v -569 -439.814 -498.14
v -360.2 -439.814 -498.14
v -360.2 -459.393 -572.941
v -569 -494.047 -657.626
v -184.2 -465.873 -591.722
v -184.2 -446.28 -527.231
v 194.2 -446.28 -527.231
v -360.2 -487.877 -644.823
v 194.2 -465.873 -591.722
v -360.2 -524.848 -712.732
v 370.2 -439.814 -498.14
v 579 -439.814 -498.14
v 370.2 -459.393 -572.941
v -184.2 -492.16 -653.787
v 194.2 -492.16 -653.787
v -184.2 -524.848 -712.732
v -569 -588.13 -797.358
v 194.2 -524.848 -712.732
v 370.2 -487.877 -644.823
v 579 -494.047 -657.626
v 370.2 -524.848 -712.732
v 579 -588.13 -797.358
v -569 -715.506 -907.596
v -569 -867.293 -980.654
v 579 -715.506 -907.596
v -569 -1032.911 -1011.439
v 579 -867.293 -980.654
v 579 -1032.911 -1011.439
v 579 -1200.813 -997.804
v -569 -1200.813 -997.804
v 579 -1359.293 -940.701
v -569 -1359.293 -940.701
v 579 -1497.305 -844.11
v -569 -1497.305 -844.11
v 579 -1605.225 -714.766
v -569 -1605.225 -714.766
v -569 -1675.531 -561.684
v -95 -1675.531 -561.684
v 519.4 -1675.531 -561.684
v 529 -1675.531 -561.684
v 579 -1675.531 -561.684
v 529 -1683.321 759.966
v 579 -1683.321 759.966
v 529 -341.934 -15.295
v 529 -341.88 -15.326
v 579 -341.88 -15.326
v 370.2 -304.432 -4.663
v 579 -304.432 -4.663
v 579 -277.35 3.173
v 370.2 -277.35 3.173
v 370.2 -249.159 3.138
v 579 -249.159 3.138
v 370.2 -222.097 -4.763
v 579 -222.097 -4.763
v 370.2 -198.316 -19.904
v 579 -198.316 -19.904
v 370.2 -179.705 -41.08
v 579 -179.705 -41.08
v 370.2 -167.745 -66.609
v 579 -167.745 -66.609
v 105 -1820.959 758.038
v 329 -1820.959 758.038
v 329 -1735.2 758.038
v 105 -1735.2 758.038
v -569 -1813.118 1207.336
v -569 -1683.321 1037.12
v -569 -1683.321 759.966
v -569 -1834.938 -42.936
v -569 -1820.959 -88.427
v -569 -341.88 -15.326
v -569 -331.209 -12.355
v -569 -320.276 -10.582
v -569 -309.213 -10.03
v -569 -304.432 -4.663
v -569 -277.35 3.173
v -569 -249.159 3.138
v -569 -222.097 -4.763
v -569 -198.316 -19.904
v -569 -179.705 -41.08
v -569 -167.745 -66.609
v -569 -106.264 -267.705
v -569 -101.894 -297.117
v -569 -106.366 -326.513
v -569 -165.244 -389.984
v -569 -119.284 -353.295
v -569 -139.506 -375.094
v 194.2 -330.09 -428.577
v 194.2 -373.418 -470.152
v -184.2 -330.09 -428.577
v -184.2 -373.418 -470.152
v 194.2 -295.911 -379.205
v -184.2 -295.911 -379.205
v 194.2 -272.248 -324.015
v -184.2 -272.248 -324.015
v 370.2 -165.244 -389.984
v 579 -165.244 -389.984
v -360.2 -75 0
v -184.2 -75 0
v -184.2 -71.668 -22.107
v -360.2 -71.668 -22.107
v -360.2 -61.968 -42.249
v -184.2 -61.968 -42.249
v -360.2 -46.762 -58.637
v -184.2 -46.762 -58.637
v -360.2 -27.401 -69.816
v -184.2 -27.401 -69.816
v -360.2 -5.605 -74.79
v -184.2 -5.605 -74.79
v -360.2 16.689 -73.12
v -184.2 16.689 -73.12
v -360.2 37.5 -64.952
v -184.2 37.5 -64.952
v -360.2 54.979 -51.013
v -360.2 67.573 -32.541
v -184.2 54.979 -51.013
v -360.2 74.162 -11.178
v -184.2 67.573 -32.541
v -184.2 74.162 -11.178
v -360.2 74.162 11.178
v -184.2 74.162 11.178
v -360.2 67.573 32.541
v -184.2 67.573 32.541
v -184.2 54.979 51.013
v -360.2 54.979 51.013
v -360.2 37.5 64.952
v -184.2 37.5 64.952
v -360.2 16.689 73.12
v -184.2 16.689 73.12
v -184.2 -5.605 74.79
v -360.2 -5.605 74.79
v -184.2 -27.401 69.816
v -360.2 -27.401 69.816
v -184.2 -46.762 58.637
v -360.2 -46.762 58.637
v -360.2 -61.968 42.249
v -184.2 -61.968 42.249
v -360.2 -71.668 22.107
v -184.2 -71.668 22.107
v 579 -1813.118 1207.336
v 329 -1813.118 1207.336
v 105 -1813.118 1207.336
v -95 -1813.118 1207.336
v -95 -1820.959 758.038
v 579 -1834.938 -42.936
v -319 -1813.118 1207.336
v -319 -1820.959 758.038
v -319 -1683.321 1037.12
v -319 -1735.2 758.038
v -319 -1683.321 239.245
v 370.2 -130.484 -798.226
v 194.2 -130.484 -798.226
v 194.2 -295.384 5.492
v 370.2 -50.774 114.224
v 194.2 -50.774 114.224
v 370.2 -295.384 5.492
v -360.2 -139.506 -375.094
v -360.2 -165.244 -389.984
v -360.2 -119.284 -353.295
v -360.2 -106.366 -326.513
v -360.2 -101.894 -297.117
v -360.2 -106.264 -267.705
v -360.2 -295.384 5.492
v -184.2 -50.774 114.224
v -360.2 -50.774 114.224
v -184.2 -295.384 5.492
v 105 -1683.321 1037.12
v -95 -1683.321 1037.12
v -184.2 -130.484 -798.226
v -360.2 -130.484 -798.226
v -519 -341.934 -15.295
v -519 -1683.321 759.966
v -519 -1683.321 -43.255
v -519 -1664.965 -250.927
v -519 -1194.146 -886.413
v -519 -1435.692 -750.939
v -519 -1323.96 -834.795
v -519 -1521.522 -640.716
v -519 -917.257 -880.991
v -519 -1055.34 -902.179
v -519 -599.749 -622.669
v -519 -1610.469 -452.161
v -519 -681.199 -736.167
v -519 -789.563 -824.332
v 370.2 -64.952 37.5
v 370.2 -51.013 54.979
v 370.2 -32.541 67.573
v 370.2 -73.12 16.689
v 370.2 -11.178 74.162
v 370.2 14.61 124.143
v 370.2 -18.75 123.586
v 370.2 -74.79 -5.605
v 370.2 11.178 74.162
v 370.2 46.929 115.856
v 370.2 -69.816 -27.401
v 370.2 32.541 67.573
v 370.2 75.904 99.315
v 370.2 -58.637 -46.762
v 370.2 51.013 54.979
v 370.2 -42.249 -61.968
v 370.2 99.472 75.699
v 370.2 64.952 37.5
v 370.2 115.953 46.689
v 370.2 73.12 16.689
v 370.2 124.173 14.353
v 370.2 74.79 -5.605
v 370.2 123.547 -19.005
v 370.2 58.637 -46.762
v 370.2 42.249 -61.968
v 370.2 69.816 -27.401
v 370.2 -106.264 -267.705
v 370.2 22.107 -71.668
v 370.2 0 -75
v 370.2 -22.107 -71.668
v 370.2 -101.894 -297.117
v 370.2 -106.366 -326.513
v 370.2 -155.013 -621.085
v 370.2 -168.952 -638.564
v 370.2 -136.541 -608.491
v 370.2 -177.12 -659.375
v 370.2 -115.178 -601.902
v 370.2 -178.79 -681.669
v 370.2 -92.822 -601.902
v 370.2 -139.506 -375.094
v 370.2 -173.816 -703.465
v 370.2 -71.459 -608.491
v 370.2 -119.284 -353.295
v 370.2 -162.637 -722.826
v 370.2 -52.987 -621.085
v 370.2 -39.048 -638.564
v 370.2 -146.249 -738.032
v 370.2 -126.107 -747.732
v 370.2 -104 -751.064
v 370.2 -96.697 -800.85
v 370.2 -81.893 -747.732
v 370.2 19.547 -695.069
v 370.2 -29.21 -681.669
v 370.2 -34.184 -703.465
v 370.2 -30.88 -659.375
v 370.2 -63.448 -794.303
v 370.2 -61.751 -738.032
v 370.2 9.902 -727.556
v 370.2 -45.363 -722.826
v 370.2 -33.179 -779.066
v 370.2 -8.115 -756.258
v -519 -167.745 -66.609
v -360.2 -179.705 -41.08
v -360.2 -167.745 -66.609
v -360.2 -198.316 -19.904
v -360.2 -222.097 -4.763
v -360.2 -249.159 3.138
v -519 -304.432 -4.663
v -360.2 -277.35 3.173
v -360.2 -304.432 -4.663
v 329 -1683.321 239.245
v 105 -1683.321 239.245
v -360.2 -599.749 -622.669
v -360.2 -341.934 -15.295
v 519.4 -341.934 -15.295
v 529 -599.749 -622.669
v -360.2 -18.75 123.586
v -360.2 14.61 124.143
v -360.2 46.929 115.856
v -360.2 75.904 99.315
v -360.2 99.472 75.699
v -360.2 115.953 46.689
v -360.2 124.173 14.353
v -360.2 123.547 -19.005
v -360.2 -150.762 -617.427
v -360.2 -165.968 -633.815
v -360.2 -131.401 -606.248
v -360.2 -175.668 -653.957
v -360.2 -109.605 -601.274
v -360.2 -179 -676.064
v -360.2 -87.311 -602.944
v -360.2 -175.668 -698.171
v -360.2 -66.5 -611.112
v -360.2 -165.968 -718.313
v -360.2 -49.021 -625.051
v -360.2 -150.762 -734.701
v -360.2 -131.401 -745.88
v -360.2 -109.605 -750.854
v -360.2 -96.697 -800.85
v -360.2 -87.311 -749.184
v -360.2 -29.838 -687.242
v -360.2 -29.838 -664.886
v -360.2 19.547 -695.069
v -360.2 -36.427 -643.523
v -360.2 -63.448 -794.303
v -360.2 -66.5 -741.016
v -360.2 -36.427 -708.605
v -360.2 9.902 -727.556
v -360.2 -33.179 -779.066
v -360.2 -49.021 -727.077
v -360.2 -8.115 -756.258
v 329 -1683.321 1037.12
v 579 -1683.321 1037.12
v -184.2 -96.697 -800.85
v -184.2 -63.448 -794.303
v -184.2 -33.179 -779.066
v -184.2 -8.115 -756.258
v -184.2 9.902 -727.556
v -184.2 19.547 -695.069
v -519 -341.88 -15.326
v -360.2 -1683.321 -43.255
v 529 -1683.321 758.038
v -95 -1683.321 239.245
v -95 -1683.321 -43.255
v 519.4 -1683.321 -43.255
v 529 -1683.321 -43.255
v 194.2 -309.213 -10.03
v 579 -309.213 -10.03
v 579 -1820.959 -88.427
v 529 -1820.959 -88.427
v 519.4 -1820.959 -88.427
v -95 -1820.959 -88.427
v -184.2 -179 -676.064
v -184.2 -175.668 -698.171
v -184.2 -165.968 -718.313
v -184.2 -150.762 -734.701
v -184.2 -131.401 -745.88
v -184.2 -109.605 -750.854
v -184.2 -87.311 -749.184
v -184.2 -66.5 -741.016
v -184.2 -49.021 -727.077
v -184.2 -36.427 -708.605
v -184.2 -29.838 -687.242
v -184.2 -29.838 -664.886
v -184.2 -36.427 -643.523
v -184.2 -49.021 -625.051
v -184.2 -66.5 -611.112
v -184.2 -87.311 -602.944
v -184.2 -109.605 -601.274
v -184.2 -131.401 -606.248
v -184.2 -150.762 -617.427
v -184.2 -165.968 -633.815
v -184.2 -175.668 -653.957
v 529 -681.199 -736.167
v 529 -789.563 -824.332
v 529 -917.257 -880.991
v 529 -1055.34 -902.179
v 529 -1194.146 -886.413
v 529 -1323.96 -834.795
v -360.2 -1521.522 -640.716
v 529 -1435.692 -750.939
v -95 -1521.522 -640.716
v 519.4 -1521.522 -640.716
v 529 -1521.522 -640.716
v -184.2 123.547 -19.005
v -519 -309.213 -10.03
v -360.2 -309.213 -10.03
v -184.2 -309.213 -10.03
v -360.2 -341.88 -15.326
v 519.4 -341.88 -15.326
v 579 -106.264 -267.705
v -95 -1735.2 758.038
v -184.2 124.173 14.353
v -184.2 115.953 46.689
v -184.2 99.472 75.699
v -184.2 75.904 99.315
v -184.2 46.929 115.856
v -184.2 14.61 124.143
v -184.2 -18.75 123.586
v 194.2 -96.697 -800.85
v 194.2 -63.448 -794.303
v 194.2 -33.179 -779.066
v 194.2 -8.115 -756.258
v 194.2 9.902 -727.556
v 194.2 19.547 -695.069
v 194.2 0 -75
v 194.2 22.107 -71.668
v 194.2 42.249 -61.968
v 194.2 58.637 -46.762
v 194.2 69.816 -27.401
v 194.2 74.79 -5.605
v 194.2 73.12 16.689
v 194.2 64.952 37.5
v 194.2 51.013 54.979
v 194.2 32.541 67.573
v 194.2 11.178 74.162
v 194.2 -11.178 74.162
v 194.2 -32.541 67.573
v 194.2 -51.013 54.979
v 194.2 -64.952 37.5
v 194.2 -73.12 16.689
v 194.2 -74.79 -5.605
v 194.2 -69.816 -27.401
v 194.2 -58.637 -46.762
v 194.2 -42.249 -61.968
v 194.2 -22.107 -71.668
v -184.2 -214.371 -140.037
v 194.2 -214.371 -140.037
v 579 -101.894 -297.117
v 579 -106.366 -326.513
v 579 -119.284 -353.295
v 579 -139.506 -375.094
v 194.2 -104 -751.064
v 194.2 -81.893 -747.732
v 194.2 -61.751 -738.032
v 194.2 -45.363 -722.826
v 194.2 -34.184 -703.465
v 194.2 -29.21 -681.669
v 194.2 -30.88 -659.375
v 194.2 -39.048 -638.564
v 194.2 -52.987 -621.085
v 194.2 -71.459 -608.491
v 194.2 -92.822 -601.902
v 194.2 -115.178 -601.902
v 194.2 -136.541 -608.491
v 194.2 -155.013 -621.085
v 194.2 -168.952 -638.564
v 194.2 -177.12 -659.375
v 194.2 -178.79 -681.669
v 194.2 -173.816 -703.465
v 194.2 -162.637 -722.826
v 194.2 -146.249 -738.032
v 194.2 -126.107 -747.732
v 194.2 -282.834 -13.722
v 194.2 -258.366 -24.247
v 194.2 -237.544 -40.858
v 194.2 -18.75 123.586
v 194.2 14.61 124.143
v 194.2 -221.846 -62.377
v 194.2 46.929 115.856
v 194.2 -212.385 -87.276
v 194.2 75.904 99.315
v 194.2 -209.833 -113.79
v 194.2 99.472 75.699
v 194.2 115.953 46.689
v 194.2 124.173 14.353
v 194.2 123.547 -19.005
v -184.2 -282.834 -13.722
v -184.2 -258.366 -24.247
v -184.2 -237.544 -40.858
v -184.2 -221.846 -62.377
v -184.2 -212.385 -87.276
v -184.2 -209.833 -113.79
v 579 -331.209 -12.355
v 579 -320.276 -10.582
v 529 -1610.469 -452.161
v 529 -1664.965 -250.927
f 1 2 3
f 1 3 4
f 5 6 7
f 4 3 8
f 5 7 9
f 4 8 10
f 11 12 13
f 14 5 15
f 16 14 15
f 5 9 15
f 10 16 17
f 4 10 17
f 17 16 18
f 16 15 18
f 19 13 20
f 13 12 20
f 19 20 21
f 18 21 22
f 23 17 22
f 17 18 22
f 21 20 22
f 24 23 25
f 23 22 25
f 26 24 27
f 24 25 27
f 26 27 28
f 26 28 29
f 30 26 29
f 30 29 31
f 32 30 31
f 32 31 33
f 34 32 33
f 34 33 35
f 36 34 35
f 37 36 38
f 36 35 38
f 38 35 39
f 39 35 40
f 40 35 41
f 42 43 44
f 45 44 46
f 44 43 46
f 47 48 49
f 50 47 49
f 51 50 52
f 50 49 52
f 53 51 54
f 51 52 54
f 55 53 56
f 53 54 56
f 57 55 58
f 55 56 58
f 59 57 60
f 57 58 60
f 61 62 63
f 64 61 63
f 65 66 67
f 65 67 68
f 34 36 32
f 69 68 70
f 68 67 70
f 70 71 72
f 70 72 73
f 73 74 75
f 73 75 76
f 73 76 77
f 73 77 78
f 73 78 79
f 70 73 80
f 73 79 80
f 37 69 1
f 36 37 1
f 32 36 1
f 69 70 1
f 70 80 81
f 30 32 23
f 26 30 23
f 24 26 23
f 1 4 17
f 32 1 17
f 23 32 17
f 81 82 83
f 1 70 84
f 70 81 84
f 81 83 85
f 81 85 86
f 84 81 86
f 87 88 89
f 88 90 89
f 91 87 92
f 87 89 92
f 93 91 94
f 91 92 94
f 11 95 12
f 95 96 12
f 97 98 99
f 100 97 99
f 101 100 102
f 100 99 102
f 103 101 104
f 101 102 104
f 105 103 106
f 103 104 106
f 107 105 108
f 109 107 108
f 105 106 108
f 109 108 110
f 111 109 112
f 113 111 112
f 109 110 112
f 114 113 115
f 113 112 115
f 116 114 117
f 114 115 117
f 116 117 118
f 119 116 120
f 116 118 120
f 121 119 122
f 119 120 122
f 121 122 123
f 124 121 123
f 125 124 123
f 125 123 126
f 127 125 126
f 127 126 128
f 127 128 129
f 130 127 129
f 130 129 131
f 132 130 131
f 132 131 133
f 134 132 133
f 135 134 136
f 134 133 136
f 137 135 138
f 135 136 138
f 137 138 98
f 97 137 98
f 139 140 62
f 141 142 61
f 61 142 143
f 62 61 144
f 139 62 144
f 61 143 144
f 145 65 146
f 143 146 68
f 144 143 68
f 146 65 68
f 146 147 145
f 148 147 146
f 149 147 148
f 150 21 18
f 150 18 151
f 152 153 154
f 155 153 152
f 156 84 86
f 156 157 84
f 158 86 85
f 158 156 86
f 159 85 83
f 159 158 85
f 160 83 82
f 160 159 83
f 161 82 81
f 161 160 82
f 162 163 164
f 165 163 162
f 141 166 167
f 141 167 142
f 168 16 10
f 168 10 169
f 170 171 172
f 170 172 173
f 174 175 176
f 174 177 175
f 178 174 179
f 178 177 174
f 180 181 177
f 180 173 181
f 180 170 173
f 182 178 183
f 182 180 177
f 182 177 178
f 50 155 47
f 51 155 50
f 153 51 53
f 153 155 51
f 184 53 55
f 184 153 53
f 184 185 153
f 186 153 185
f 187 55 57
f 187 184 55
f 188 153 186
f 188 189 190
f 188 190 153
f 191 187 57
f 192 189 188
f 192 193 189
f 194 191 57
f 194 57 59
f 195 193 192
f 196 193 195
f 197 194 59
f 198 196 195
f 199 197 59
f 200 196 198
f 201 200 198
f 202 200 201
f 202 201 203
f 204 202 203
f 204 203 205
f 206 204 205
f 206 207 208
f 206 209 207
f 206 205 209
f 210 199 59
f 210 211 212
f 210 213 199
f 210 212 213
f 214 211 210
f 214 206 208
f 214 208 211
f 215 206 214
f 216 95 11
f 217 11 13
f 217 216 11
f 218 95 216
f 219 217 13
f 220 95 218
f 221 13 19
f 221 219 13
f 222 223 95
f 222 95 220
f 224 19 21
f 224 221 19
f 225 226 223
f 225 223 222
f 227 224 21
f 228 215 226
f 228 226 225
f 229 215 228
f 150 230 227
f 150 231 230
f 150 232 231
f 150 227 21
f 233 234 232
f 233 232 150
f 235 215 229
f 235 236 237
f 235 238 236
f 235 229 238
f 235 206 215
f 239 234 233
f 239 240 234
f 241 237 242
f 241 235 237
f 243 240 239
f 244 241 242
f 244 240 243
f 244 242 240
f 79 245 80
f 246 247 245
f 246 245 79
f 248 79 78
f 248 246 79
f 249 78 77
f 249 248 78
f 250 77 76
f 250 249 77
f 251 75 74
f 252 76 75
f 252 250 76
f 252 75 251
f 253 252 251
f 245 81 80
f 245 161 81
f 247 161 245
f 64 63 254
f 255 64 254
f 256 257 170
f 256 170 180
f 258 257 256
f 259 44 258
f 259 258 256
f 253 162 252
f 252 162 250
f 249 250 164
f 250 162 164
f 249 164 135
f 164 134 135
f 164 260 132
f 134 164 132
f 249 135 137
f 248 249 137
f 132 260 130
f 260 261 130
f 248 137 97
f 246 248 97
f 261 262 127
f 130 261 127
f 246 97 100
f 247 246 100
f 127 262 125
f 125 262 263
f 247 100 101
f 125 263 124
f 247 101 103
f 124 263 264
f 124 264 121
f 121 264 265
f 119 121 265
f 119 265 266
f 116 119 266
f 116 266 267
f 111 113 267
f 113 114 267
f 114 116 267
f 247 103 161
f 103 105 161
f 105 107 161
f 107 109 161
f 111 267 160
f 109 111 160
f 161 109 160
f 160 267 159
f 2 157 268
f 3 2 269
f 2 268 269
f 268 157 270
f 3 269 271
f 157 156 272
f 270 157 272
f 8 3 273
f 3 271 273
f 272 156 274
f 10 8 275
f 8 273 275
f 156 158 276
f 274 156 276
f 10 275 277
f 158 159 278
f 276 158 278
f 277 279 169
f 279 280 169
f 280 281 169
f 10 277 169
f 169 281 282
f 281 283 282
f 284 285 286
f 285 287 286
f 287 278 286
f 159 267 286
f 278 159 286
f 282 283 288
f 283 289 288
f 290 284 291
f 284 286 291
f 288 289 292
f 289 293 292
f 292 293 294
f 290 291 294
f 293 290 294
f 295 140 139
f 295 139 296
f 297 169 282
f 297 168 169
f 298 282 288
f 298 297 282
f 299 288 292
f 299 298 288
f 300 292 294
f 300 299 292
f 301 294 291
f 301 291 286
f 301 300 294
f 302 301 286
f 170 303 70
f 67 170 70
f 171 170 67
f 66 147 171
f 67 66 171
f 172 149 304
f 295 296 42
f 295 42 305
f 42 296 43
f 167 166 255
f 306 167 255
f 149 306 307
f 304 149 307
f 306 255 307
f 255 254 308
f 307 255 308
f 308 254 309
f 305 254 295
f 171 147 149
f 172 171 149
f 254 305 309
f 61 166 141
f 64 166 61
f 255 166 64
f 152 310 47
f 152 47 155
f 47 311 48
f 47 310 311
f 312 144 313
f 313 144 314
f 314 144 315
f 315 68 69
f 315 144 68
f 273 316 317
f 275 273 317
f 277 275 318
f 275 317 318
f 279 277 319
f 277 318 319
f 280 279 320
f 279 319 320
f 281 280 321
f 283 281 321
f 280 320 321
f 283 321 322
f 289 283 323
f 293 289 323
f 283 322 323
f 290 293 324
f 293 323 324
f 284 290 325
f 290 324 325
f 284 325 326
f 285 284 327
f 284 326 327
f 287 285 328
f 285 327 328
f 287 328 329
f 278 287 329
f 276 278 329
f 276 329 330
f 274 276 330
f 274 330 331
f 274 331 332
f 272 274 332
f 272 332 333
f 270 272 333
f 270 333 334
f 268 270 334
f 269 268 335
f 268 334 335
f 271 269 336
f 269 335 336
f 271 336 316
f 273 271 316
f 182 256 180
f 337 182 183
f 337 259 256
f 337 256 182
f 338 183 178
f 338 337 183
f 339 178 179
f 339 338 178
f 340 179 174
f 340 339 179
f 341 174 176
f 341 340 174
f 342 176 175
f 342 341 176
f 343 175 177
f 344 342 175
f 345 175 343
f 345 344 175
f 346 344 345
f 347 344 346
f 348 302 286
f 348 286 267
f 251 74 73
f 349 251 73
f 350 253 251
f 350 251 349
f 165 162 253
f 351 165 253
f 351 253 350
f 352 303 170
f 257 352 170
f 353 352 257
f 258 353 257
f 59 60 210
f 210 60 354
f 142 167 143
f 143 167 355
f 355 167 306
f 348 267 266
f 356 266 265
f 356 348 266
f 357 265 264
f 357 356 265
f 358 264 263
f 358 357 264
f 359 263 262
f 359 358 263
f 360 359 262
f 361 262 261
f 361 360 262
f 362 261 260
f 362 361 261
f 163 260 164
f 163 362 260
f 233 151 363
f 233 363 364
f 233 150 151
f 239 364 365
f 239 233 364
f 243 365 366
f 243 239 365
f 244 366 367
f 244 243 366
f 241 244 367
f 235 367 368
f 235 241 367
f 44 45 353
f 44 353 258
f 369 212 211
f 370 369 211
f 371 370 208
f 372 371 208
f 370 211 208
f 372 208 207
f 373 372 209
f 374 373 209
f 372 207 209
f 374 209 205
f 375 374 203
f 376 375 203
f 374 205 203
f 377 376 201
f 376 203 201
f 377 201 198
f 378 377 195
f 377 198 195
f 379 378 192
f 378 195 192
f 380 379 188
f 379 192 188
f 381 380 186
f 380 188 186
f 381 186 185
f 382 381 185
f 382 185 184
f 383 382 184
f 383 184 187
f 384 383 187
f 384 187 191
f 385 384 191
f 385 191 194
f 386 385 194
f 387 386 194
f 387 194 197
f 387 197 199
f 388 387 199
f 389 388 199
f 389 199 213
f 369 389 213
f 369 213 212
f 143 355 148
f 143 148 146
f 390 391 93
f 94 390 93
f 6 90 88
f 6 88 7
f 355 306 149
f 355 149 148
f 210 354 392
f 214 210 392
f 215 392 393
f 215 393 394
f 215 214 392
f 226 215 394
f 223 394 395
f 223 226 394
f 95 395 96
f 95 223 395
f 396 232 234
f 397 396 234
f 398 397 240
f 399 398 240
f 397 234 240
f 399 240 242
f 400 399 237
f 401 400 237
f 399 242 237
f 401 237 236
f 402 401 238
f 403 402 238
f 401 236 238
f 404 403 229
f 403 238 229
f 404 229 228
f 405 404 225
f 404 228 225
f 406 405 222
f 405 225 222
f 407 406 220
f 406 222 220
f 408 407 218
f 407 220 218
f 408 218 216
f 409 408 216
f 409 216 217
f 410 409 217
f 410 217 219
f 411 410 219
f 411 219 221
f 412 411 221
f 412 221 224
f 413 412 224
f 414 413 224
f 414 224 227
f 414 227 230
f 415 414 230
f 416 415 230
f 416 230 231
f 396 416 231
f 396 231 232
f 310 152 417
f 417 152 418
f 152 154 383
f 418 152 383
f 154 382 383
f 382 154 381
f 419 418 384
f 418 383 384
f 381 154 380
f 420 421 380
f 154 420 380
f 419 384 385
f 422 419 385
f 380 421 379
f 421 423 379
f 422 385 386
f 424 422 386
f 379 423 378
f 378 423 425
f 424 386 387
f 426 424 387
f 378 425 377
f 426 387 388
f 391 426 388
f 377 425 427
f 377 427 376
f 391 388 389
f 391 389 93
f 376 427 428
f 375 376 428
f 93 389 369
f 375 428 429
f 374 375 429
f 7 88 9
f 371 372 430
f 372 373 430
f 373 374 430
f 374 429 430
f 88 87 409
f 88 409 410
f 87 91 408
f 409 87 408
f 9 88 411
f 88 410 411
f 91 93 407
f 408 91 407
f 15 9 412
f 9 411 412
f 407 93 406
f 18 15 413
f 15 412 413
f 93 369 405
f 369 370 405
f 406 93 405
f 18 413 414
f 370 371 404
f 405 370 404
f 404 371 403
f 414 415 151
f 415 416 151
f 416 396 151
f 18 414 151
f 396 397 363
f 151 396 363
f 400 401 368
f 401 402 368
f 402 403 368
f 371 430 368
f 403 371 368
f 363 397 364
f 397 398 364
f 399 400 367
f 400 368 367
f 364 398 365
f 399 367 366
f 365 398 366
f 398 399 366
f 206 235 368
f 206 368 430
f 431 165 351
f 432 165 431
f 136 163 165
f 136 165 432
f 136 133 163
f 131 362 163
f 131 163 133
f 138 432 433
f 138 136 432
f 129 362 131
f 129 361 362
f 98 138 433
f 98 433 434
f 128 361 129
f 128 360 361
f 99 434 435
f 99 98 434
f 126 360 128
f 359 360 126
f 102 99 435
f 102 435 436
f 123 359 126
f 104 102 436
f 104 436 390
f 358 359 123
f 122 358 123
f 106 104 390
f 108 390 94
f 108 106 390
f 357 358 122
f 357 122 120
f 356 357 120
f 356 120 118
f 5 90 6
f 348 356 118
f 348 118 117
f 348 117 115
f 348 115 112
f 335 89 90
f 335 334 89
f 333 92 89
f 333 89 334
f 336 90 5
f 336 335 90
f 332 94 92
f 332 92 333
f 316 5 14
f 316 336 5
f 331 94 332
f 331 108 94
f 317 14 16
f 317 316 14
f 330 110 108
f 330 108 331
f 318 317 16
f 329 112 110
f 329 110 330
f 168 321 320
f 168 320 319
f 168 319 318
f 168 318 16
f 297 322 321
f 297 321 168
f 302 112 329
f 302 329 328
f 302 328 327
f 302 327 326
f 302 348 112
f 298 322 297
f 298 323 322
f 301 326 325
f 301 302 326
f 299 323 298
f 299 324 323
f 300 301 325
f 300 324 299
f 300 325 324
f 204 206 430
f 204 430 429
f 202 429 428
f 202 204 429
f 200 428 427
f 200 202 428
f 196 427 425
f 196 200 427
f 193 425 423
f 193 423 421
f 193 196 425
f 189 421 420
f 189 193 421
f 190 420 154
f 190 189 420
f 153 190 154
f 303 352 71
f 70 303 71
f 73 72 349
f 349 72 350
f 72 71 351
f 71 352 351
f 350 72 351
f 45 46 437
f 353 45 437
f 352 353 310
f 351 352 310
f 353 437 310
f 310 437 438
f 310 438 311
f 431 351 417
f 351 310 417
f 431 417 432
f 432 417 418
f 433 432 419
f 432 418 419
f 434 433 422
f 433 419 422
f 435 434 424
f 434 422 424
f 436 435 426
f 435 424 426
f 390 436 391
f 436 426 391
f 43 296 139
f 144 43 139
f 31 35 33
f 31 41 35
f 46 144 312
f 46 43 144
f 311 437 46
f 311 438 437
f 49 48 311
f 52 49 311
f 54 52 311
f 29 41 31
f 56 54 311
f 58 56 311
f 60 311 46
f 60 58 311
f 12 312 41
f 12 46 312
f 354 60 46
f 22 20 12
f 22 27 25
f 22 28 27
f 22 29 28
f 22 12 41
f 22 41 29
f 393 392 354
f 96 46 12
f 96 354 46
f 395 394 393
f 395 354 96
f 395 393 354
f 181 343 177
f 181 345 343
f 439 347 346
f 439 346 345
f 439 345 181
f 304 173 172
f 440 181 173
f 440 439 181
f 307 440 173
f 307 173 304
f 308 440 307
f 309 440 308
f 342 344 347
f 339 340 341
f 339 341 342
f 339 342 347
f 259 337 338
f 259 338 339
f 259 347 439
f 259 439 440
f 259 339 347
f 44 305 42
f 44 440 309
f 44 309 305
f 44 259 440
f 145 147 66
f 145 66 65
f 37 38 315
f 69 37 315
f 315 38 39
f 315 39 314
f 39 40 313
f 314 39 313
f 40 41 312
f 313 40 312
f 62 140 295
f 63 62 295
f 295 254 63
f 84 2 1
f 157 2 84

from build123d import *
from build123d.topology import SkipClean

# Parameters (mm, degrees)
BOSS_EXTRUDE1_DEPTH   = 9.600009513678287
BOSS_EXTRUDE2_DEPTH   = 514.3999904863157
CUT_EXTRUDE1_DEPTH    = 199.99999999999986
CUT_EXTRUDE2_DEPTH    = 224.00000000000003
BOSS_EXTRUDE3_DEPTH   = 100.00000000000634
BOSS_EXTRUDE4_DEPTH   = 223.9999999999994
BOSS_EXTRUDE5_DEPTH   = 41.20000000000044
CUT_EXTRUDE3_DEPTH    = 158.79999999999976
BOSS_EXTRUDE6_DEPTH   = 149.19999048631087
CUT_EXTRUDE4_DEPTH    = 378.3999999999982
BOSS_EXTRUDE7_DEPTH   = 9.600009513685004
BOSS_EXTRUDE8_DEPTH   = 49.99999999999939
BOSS_EXTRUDE9_DEPTH   = 279.08274569611746
BOSS_EXTRUDE10_START  = 50.00000000000021
BOSS_EXTRUDE10_DEPTH  = 50.00000000000021
DRAFT1_START          = -793
DRAFT1_DEPTH          = 1150
DRAFT1_START_2        = -791.766847587
DRAFT1_2_DEPTH        = 1148
DRAFT2_ANGLE          = 52.67292498717598
HOLE1_AT_2_COUNT      = 2
HOLE1_AT_2_PITCH      = 684.016470632103
HOLE2_D               = 150
HOLE2_DEPTH           = 384.8
FILLET1_R             = 100.00000000000001
FILLET2_R             = 125
FILLET3_R             = 300
BODY_MOVE_COPY3_ANGLE = 90.0000000000002
BODY_MOVE_COPY4_ANGLE = 120.00000000000021


with BuildPart() as part:
    # Sketch1 → Boss-Extrude1 (new body)
    with BuildSketch(Plane.XY.offset(306.2331524125839)):
        with BuildLine():
            Line((53.08147760316467, -1766.447394034807), (-1027.2936921096916, -1766.4473940348073))
            Line((-1027.2936921096916, -1766.4473940348073), (-1027.2936921096916, -1904.0857327222143))
            Line((-1027.2936921096916, -1904.0857327222143), (98.25366379894766, -1904.0857327222143))
            Line((98.25366379894766, -1904.0857327222143), (571.5107857447487, -1758.657947920252))
            ThreePointArc((571.5107857447487, -1758.657947920252), (1016.6806746482655, -1231.839040201803), (722.5590166804343, -607.9745983313888))
            Line((722.5590166804343, -607.9745983313888), (836.1992361834356, -83.77870158177328))
            Line((836.1992361834356, -83.77870158177328), (28.832182943648764, 40.41985585796329))
            ThreePointArc((28.832182943648764, 40.41985585796329), (-89.48849099605702, -7.222499827583533), (-104.39684181466816, -133.9005050719176))
            Line((-104.39684181466816, -133.9005050719176), (4.335247948888093, -378.51123875566793))
            Line((4.335247948888093, -378.51123875566793), (19.856318658240184, -392.340008322466))
            ThreePointArc((19.856318658240184, -392.340008322466), (21.14387371916233, -408.89399605142665), (25.152813367140993, -425.0067459925245))
            Line((25.152813367140993, -425.0067459925245), (25.121496409919185, -425.06093181631854))
            Line((25.121496409919185, -425.06093181631854), (632.4957363404607, -682.8760006812848))
            ThreePointArc((632.4957363404607, -682.8760006812848), (912.0062760274534, -1138.4665882307247), (650.5429820351718, -1604.6488177874323))
            ThreePointArc((650.5429820351718, -1604.6488177874323), (362.57260370932397, -1725.2821339957313), (53.08147760316467, -1766.447394034807))
        make_face()
    extrude(amount=-BOSS_EXTRUDE1_DEPTH)

    # Sketch2 → Boss-Extrude2 (add)
    with SkipClean():  # the faces are left unmerged after this step: merging them gives an invalid solid
        with BuildSketch(Plane(origin=(0, 0, 296.6331428989056), x_dir=(-1, 0, 0), z_dir=(0, 0, -1))):
            with BuildLine():
                Line((-53.08147763303338, -1766.4473939156126), (1027.293692098456, -1766.4473939156126))
                Line((1027.293692098456, -1766.4473939156126), (1027.293692098456, -1904.0857326059793))
                Line((1027.293692098456, -1904.0857326059793), (-98.2536638101782, -1904.0857326059797))
                Line((-98.2536638101782, -1904.0857326059797), (-571.5107857559829, -1758.6579478040192))
                ThreePointArc((-571.5107857559829, -1758.6579478040192), (-1016.6806746151524, -1231.8390401398947), (-722.5590166804387, -607.9745983313868))
                Line((-722.5590166804387, -607.9745983313868), (-836.1992361834398, -83.77870158177345))
                Line((-836.1992361834398, -83.77870158177345), (-28.832182943652366, 40.41985585796323))
                ThreePointArc((-28.832182943652366, 40.41985585796323), (89.4884909960535, -7.222499827583732), (104.39684181466478, -133.90050507191813))
                Line((104.39684181466478, -133.90050507191813), (-4.335247948891731, -378.51123875566793))
                Line((-4.335247948891731, -378.51123875566793), (-19.856318658241946, -392.340008322466))
                ThreePointArc((-19.856318658241946, -392.340008322466), (-21.14387371916395, -408.8939960514259), (-25.152813367143864, -425.0067459925226))
                Line((-25.152813367143864, -425.0067459925226), (-25.121496409920812, -425.0609318163162))
                Line((-25.121496409920812, -425.0609318163162), (-632.4957363404753, -682.8760006812888))
                ThreePointArc((-632.4957363404753, -682.8760006812888), (-912.0062759939467, -1138.4665881761014), (-650.5429820330173, -1604.6488176769096))
                ThreePointArc((-650.5429820330173, -1604.6488176769096), (-362.57260372260464, -1725.282133878744), (-53.08147763303338, -1766.4473939156126))
            make_face()
        extrude(amount=BOSS_EXTRUDE2_DEPTH)

    # Sketch3 → Cut-Extrude1 (cut)
    with SkipClean():  # the faces are left unmerged after this step: merging them gives an invalid solid
        with BuildSketch(Plane.XY.offset(306.2331524125839)):
            Polygon((-1027.29369209846, -1904.085732605916), (-748.21094640232, -1904.0857326059318), (-748.2109464023167, -1766.44739383907), (-1027.2936920984598, -1766.4473938390806), align=None)
        extrude(amount=-CUT_EXTRUDE1_DEPTH, mode=Mode.SUBTRACT)

    # Sketch4 → Cut-Extrude2 (cut)
    with SkipClean():  # the faces are left unmerged after this step: merging them gives an invalid solid
        with BuildSketch(Plane.XY.offset(106.23315241258402)):
            Polygon((-229.4181464023195, -1766.4473938390802), (-1027.2936920984598, -1766.4473938390806), (-1027.29369209846, -1904.085732605916), (-748.21094640232, -1904.0857326059318), (-748.2109464023184, -1818.3266738390705), align=None)
        extrude(amount=-CUT_EXTRUDE2_DEPTH, mode=Mode.SUBTRACT)

    # Sketch5 → Boss-Extrude3 (add)
    with BuildSketch(Plane(origin=(0, 0, -217.7668475874101), x_dir=(-1, 0, 0), z_dir=(0, 0, -1))):
        with BuildLine():
            Line((-53.081477633029785, -1766.4473939156126), (1027.2936920984594, -1766.4473939156126))
            Line((1027.2936920984594, -1766.4473939156126), (1027.2936920984594, -1904.0857326059793))
            Line((1027.2936920984594, -1904.0857326059793), (-98.2536638101746, -1904.0857326059797))
            Line((-98.2536638101746, -1904.0857326059797), (-571.5107857559792, -1758.6579478040192))
            ThreePointArc((-571.5107857559792, -1758.6579478040192), (-1016.6806746151486, -1231.8390401398945), (-722.5590166804352, -607.9745983313868))
            Line((-722.5590166804352, -607.9745983313868), (-836.1992361834363, -83.77870158177345))
            Line((-836.1992361834363, -83.77870158177345), (-28.832182943648775, 40.41985585796323))
            ThreePointArc((-28.832182943648775, 40.41985585796323), (89.4884909960571, -7.222499827583732), (104.39684181466838, -133.90050507191813))
            Line((104.39684181466838, -133.90050507191813), (-4.3352479488881395, -378.51123875566793))
            Line((-4.3352479488881395, -378.51123875566793), (-19.856318658238703, -392.340008322466))
            ThreePointArc((-19.856318658238703, -392.340008322466), (-21.14387371916071, -408.89399605142586), (-25.152813367140272, -425.0067459925226))
            Line((-25.152813367140272, -425.0067459925226), (-25.12149640991722, -425.0609318163162))
            Line((-25.12149640991722, -425.0609318163162), (-632.4957363404717, -682.8760006812888))
            ThreePointArc((-632.4957363404717, -682.8760006812888), (-912.0062759939432, -1138.4665881761014), (-650.5429820330137, -1604.6488176769096))
            ThreePointArc((-650.5429820330137, -1604.6488176769096), (-362.57260372260106, -1725.282133878744), (-53.081477633029785, -1766.4473939156126))
        make_face()
    extrude(amount=BOSS_EXTRUDE3_DEPTH)

    # Sketch6 → Boss-Extrude4 (add)
    with SkipClean():  # the faces are left unmerged after this step: merging them gives an invalid solid
        with BuildSketch(Plane(origin=(0, 0, -317.76684758741646), x_dir=(-1, 0, 0), z_dir=(0, 0, -1))):
            with BuildLine():
                Line((-53.081477633029195, -1766.4473939156128), (229.4181463204047, -1766.4473939156128))
                Line((229.4181463204047, -1766.4473939156128), (748.2109463203855, -1818.3266739156131))
                Line((748.2109463203855, -1818.3266739156131), (748.2109463203855, -1904.0857326059795))
                Line((748.2109463203855, -1904.0857326059795), (-98.2536638101739, -1904.0857326059797))
                Line((-98.2536638101739, -1904.0857326059797), (-571.5107857559785, -1758.6579478040192))
                ThreePointArc((-571.5107857559785, -1758.6579478040192), (-1016.6806746151481, -1231.8390401398947), (-722.5590166804345, -607.9745983313868))
                Line((-722.5590166804345, -607.9745983313868), (-836.1992361834356, -83.77870158177345))
                Line((-836.1992361834356, -83.77870158177345), (-28.83218294364808, 40.41985585796323))
                ThreePointArc((-28.83218294364808, 40.41985585796323), (89.48849099605779, -7.222499827583732), (104.39684181466907, -133.90050507191813))
                Line((104.39684181466907, -133.90050507191813), (-4.335247948887441, -378.51123875566793))
                Line((-4.335247948887441, -378.51123875566793), (-19.856318658238788, -392.340008322466))
                ThreePointArc((-19.856318658238788, -392.340008322466), (-21.14387371916078, -408.89399605142575), (-25.152813367139576, -425.0067459925226))
                Line((-25.152813367139576, -425.0067459925226), (-25.121496409916524, -425.0609318163162))
                Line((-25.121496409916524, -425.0609318163162), (-632.4957363404711, -682.8760006812888))
                ThreePointArc((-632.4957363404711, -682.8760006812888), (-912.0062759939424, -1138.4665881761016), (-650.5429820330128, -1604.6488176769099))
                ThreePointArc((-650.5429820330128, -1604.6488176769099), (-362.5726037226002, -1725.282133878744), (-53.081477633029195, -1766.4473939156128))
            make_face()
        extrude(amount=BOSS_EXTRUDE4_DEPTH)

    # Sketch7 → Boss-Extrude5 (add)
    with BuildSketch(Plane(origin=(0, 0, -541.7668475874159), x_dir=(-1, 0, 0), z_dir=(0, 0, -1))):
        with BuildLine():
            Line((-722.5590166804329, -607.9745983313868), (-836.1992361834341, -83.77870158177345))
            Line((-836.1992361834341, -83.77870158177345), (-28.83218294364651, 40.41985585796323))
            ThreePointArc((-28.83218294364651, 40.41985585796323), (89.48849099605935, -7.222499827583732), (104.39684181467064, -133.90050507191813))
            Line((104.39684181467064, -133.90050507191813), (-4.335247948885877, -378.51123875566793))
            Line((-4.335247948885877, -378.51123875566793), (-19.856318658237367, -392.340008322466))
            ThreePointArc((-19.856318658237367, -392.340008322466), (-21.14387371915936, -408.89399605142575), (-25.15281336713801, -425.0067459925226))
            Line((-25.15281336713801, -425.0067459925226), (-25.12149640991496, -425.0609318163162))
            Line((-25.12149640991496, -425.0609318163162), (-632.4957363404695, -682.8760006812888))
            ThreePointArc((-632.4957363404695, -682.8760006812888), (-912.0062759939407, -1138.4665881761018), (-650.5429820330108, -1604.6488176769099))
            ThreePointArc((-650.5429820330108, -1604.6488176769099), (-362.57260372259833, -1725.282133878744), (-53.081477633027575, -1766.4473939156126))
            Line((-53.081477633027575, -1766.4473939156126), (1027.2936920984582, -1766.4473939156126))
            Line((1027.2936920984582, -1766.4473939156126), (1027.2936920984582, -1904.0857326059793))
            Line((1027.2936920984582, -1904.0857326059793), (-98.25366381017234, -1904.0857326059797))
            Line((-98.25366381017234, -1904.0857326059797), (-571.510785755977, -1758.6579478040192))
            ThreePointArc((-571.510785755977, -1758.6579478040192), (-1016.6806746151462, -1231.8390401398947), (-722.5590166804329, -607.9745983313868))
        make_face()
    extrude(amount=BOSS_EXTRUDE5_DEPTH)

    # Sketch8 → Cut-Extrude3 (cut)
    with BuildSketch(Plane.XY.offset(306.2331524125839)):
        with BuildLine():
            Line((-104.39684181466816, -133.9005050719176), (4.335247948888093, -378.51123875566793))
            Line((4.335247948888093, -378.51123875566793), (14.489613985965955, -387.5584488775228))
            ThreePointArc((14.489613985965955, -387.5584488775228), (14.590003133143597, -305.2236767235862), (76.43568070724513, -250.87170390730495))
            Line((76.43568070724513, -250.87170390730495), (365.9318713497288, -162.3638362624787))
            Line((365.9318713497288, -162.3638362624787), (507.9668142543914, -522.9405451781555))
            ThreePointArc((507.9668142543914, -522.9405451781555), (619.1405258320616, -555.6720221138472), (722.5590166804343, -607.9745983313888))
            Line((722.5590166804343, -607.9745983313888), (836.1992361834356, -83.77870158177328))
            Line((836.1992361834356, -83.77870158177328), (28.832182943648764, 40.41985585796329))
            ThreePointArc((28.832182943648764, 40.41985585796329), (-89.48849099605702, -7.222499827583533), (-104.39684181466816, -133.9005050719176))
        make_face()
    extrude(amount=-CUT_EXTRUDE3_DEPTH, mode=Mode.SUBTRACT)

    # Sketch9 → Boss-Extrude6 (add)
    with BuildSketch(Plane(origin=(0, 0, -582.9668475874164), x_dir=(-1, 0, 0), z_dir=(0, 0, -1))):
        with BuildLine():
            Line((-25.1528133969194, -425.00674593665815), (-25.121496439696347, -425.0609317604518))
            Line((-25.121496439696347, -425.0609317604518), (-632.4957363702508, -682.8760006254245))
            ThreePointArc((-632.4957363702508, -682.8760006254245), (-912.0062760572353, -1138.4665881748622), (-650.5429820649566, -1604.6488177315662))
            ThreePointArc((-650.5429820649566, -1604.6488177315662), (-362.5726037391466, -1725.2821339398504), (-53.08147763302735, -1766.4473939789204))
            Line((-53.08147763302735, -1766.4473939789204), (1027.2936920984585, -1766.4473939789204))
            Line((1027.2936920984585, -1766.4473939789204), (1027.2936920984585, -1904.0857326059793))
            Line((1027.2936920984585, -1904.0857326059793), (-98.25366381017204, -1904.0857326059797))
            Line((-98.25366381017204, -1904.0857326059797), (-571.5107857559767, -1758.6579478040192))
            ThreePointArc((-571.5107857559767, -1758.6579478040192), (-1021.2655844178603, -1116.037821102927), (-507.96681425438925, -522.9405451781541))
            Line((-507.96681425438925, -522.9405451781541), (-365.93187134972715, -162.36383626247863))
            Line((-365.93187134972715, -162.36383626247863), (-76.43568075553172, -250.8717038925416))
            ThreePointArc((-76.43568075553172, -250.8717038925416), (-14.59000319073344, -305.2236766882949), (-14.48961401574584, -387.55844882165815))
            Line((-14.48961401574584, -387.55844882165815), (-19.856318688019385, -392.3400082666016))
            ThreePointArc((-19.856318688019385, -392.3400082666016), (-21.143873748941374, -408.89399599556117), (-25.1528133969194, -425.00674593665815))
        make_face()
    extrude(amount=BOSS_EXTRUDE6_DEPTH)

    # Sketch10 → Cut-Extrude4 (cut)
    with BuildSketch(Plane.XY.offset(-28.56684758741631)):
        with BuildLine():
            Line((149.86368907718216, -297.4981497888479), (422.5993383847587, -383.2974405420883))
            Line((422.5993383847587, -383.2974405420883), (537.0574725944384, -529.407137109236))
            ThreePointArc((537.0574725944384, -529.407137109236), (632.9288557363569, -561.3229552494635), (722.5590166804348, -607.9745983313883))
            Line((722.5590166804348, -607.9745983313883), (836.1992361834361, -83.77870158177348))
            Line((836.1992361834361, -83.77870158177348), (28.832182943648167, 40.41985585796329))
            ThreePointArc((28.832182943648167, 40.41985585796329), (-89.48849099605714, -7.222499827583846), (-104.39684181466868, -133.90050507191796))
            Line((-104.39684181466868, -133.90050507191796), (4.335247948887403, -378.5112387556677))
            Line((4.335247948887403, -378.5112387556677), (19.85631865823901, -392.34000832246596))
            ThreePointArc((19.85631865823901, -392.34000832246596), (60.919413328362104, -312.1017843461267), (149.86368907718216, -297.4981497888479))
        make_face()
    extrude(amount=-CUT_EXTRUDE4_DEPTH, mode=Mode.SUBTRACT)

    # Sketch11 → Boss-Extrude7 (add)
    with BuildSketch(Plane(origin=(0, 0, -732.1668380737271), x_dir=(-1, 0, 0), z_dir=(0, 0, -1))):
        with BuildLine():
            Line((-25.152813396918305, -425.00674593665826), (-25.121496439695253, -425.0609317604519))
            Line((-25.121496439695253, -425.0609317604519), (-632.4957363702498, -682.8760006254246))
            ThreePointArc((-632.4957363702498, -682.8760006254246), (-912.006276057234, -1138.4665881748624), (-650.5429820649556, -1604.6488177315662))
            ThreePointArc((-650.5429820649556, -1604.6488177315662), (-362.5726037391455, -1725.2821339398504), (-53.08147763302631, -1766.4473939789204))
            Line((-53.08147763302631, -1766.4473939789204), (1027.2936920984596, -1766.4473939789204))
            Line((1027.2936920984596, -1766.4473939789204), (1027.2936920984596, -1904.0857326059793))
            Line((1027.2936920984596, -1904.0857326059793), (-98.253663810171, -1904.0857326059797))
            Line((-98.253663810171, -1904.0857326059797), (-571.5107857559757, -1758.6579478040192))
            ThreePointArc((-571.5107857559757, -1758.6579478040192), (-1021.2655844178593, -1116.037821102927), (-507.9668142543883, -522.9405451781541))
            Line((-507.9668142543883, -522.9405451781541), (-365.9318713497261, -162.36383626247863))
            Line((-365.9318713497261, -162.36383626247863), (-76.43568075553054, -250.87170389254166))
            ThreePointArc((-76.43568075553054, -250.87170389254166), (-14.590003190732247, -305.223676688295), (-14.489614015744714, -387.55844882165826))
            Line((-14.489614015744714, -387.55844882165826), (-19.856318688018295, -392.3400082666017))
            ThreePointArc((-19.856318688018295, -392.3400082666017), (-21.14387374894028, -408.8939959955613), (-25.152813396918305, -425.00674593665826))
        make_face()
    extrude(amount=BOSS_EXTRUDE7_DEPTH)

    # Sketch12 → Boss-Extrude8 (add)
    with SkipClean():  # the faces are left unmerged after this step: merging them gives an invalid solid
        with BuildSketch(Plane(origin=(0, 0, -741.7668475874121), x_dir=(-1, 0, 0), z_dir=(0, 0, -1))):
            with BuildLine():
                Line((-365.93187134972607, -162.36383626247863), (-76.4356807072422, -250.8717039073049))
                ThreePointArc((-76.4356807072422, -250.8717039073049), (-14.590003133141124, -305.2236767235862), (-14.489613985962942, -387.55844887752255))
                Line((-14.489613985962942, -387.55844887752255), (-19.85631865823669, -392.3400083224661))
                ThreePointArc((-19.85631865823669, -392.3400083224661), (-21.143873719158677, -408.89399605142563), (-25.152813367136616, -425.0067459925226))
                Line((-25.152813367136616, -425.0067459925226), (750.1392546412519, -1766.4473938390702))
                Line((750.1392546412519, -1766.4473938390702), (1027.293692098458, -1766.4473938390702))
                Line((1027.293692098458, -1766.4473938390702), (1027.2936920984596, -1904.0857326059793))
                Line((1027.2936920984596, -1904.0857326059793), (-98.25366381017093, -1904.0857326059797))
                Line((-98.25366381017093, -1904.0857326059797), (-571.5107857559756, -1758.6579478040192))
                ThreePointArc((-571.5107857559756, -1758.6579478040192), (-1021.2655844178594, -1116.037821102927), (-507.96681425438817, -522.9405451781541))
                Line((-507.96681425438817, -522.9405451781541), (-365.93187134972607, -162.36383626247863))
            make_face()
        extrude(amount=BOSS_EXTRUDE8_DEPTH)

    # Sketch13 → Boss-Extrude9 (add)
    with BuildSketch(Plane.ZY.offset(748.2109464022755)):
        Polygon((306.2331524125839, -1904.0857326059336), (106.23315241258402, -1904.0857326059336), (106.23315241258602, -1766.4473938391052), (306.23315241258393, -1766.4473938390927), align=None)
    extrude(amount=BOSS_EXTRUDE9_DEPTH)

    # Sketch14 → Boss-Extrude10 (add)
    with BuildSketch(Plane.XY.offset(306.2331524125839).offset(BOSS_EXTRUDE10_START)):
        with BuildLine():
            Line((19.85631865824079, -392.3400083224026), (14.48961398596682, -387.5584488774589))
            ThreePointArc((14.48961398596682, -387.5584488774589), (14.590003133144805, -305.22367672352243), (76.43568070724626, -250.8717039072411))
            Line((76.43568070724626, -250.8717039072411), (365.93187134972885, -162.3638362624152))
            Line((365.93187134972885, -162.3638362624152), (507.9668142543918, -522.9405451780918))
            ThreePointArc((507.9668142543918, -522.9405451780918), (1021.265584417858, -1116.0378211028633), (571.51078575598, -1758.6579478039534))
            Line((571.51078575598, -1758.6579478039534), (98.25366381017913, -1904.0857326059158))
            Line((98.25366381017913, -1904.0857326059158), (-1027.2936920984382, -1904.085732605916))
            Line((-1027.2936920984382, -1904.085732605916), (-1027.2936920984382, -1766.4473938390063))
            Line((-1027.2936920984382, -1766.4473938390063), (-750.1392546412476, -1766.4473938390065))
            Line((-750.1392546412476, -1766.4473938390065), (25.152813367141405, -425.006745992461))
            ThreePointArc((25.152813367141405, -425.006745992461), (21.14387371916291, -408.89399605136316), (19.85631865824079, -392.3400083224026))
        make_face()
    extrude(amount=-BOSS_EXTRUDE10_DEPTH)

    # Draft1: read off the stored shape, not the designer's step
    # Draft1 outline → Draft1 (cut)
    with BuildSketch(Plane.XY.offset(DRAFT1_START)):
        Polygon((-748.210939686, -1904.085732722), (-1027.293692098, -1899.215067885), (-1027.29369211, -1904.085732606), align=None)
    extrude(amount=DRAFT1_DEPTH, mode=Mode.SUBTRACT)

    # Draft1 2 outline → Draft1 2 (add)
    with BuildSketch(Plane.XY.offset(DRAFT1_START_2)):
        Polygon((98.25366381, -1904.085732722), (-748.210939686, -1904.085732722), (52.762887679, -1918.064651242), align=None)
    extrude(amount=DRAFT1_2_DEPTH)

    # Draft2
    draft2_faces = [part.faces().sort_by_distance(p)[0] for p in [
        (-1027.2936920984582, -1832.831230907224, -666.7668475977032),
        (-1027.2936920984357, -1832.831230862022, 231.23315241259633),
        (-1027.293692098456, -1832.831230881173, -217.766847577809),
    ]]
    draft(draft2_faces, Plane(origin=(53.08147760316467, -1766.447394034807, 296.6331428989056), x_dir=(1, 2.1e-16, 0), z_dir=(-2.1e-16, 1, 0)), DRAFT2_ANGLE)

    # Sketch15 → Hole1 (revolve, cut)
    with BuildSketch(Plane(origin=(9.826792637787367, -83.1268767549308, -406.9668475874145), x_dir=(0, -1, 0), z_dir=(1, 0, 0))):
        Polygon((0, 0), (0, 384.79999999999706), (74.99999999999999, 384.79999999999706), (75.00000000000003, 7.96e-15), align=None)
    hole1 = revolve(axis=Axis((9.826792637787367, -83.1268767549308, -516.9668475874146), (0, 0, 1)), mode=Mode.SUBTRACT)

    # Hole1 at 2: Hole1 ×2
    with Locations(*[Vector(0.9883738609031518, -0.15204312244688098, 0) * (i * HOLE1_AT_2_PITCH) for i in range(1, HOLE1_AT_2_COUNT)]):
        add(hole1, mode=Mode.SUBTRACT)

    # Hole2
    with Locations(Plane(origin=(0, 0, -28.56684758741631), x_dir=(-1, 0, 0), z_dir=(0, 0, -1))):
        with Locations((-685.890792638, -187.126876755), (-9.826792638, -83.126876755)):
            Hole(HOLE2_D / 2, depth=HOLE2_DEPTH)

    # Fillet1
    fillet1_edges = [part.edges().sort_by_distance(p)[0] for p in [
        (365.9318713497288, -162.36383626244697, 251.83315241258413),
        (365.93187134972663, -162.36383626247863, -687.366847587414),
    ]]
    fillet(fillet1_edges, radius=FILLET1_R)

    # Fillet2
    fillet2_edges = [part.edges().sort_by_distance(p)[0] for p in [
        (836.1992361834342, -83.77870158177343, -494.9668475874155),
        (836.1992361834351, -83.77870158177332, 59.43315241258392),
    ]]
    fillet(fillet2_edges, radius=FILLET2_R)

    # Fillet3
    fillet3_edges = [part.edges().sort_by_distance(p)[0] for p in [
        (422.5993383847587, -383.2974405420883, -217.7668475874154),
    ]]
    fillet(fillet3_edges, radius=FILLET3_R)


with BuildPart() as part_1:
    # Body-Move/Copy1: read off the stored shape, not the designer's step
    # Body-Move/Copy1: moved
    add(part.part.moved(Location((-9.8267926, 83.1268768, 0))))


with BuildPart() as part_2:
    # Body-Move/Copy2: read off the stored shape, not the designer's step
    # Body-Move/Copy2: moved
    add(part_1.part.moved(Location((0, 0, 222.7668476))))


with BuildPart() as part_3:
    # Body-Move/Copy3: moved
    add(part_2.part.rotate(Axis((0, 0, 0), (0, 0, -1)), BODY_MOVE_COPY3_ANGLE))


with BuildPart() as part_4:
    # Body-Move/Copy4: moved
    add(part_3.part.rotate(Axis((0, 0, 0), (0.5773502691896252, 0.5773502691896252, 0.5773502691896272)), BODY_MOVE_COPY4_ANGLE))


solid = part_4.part
